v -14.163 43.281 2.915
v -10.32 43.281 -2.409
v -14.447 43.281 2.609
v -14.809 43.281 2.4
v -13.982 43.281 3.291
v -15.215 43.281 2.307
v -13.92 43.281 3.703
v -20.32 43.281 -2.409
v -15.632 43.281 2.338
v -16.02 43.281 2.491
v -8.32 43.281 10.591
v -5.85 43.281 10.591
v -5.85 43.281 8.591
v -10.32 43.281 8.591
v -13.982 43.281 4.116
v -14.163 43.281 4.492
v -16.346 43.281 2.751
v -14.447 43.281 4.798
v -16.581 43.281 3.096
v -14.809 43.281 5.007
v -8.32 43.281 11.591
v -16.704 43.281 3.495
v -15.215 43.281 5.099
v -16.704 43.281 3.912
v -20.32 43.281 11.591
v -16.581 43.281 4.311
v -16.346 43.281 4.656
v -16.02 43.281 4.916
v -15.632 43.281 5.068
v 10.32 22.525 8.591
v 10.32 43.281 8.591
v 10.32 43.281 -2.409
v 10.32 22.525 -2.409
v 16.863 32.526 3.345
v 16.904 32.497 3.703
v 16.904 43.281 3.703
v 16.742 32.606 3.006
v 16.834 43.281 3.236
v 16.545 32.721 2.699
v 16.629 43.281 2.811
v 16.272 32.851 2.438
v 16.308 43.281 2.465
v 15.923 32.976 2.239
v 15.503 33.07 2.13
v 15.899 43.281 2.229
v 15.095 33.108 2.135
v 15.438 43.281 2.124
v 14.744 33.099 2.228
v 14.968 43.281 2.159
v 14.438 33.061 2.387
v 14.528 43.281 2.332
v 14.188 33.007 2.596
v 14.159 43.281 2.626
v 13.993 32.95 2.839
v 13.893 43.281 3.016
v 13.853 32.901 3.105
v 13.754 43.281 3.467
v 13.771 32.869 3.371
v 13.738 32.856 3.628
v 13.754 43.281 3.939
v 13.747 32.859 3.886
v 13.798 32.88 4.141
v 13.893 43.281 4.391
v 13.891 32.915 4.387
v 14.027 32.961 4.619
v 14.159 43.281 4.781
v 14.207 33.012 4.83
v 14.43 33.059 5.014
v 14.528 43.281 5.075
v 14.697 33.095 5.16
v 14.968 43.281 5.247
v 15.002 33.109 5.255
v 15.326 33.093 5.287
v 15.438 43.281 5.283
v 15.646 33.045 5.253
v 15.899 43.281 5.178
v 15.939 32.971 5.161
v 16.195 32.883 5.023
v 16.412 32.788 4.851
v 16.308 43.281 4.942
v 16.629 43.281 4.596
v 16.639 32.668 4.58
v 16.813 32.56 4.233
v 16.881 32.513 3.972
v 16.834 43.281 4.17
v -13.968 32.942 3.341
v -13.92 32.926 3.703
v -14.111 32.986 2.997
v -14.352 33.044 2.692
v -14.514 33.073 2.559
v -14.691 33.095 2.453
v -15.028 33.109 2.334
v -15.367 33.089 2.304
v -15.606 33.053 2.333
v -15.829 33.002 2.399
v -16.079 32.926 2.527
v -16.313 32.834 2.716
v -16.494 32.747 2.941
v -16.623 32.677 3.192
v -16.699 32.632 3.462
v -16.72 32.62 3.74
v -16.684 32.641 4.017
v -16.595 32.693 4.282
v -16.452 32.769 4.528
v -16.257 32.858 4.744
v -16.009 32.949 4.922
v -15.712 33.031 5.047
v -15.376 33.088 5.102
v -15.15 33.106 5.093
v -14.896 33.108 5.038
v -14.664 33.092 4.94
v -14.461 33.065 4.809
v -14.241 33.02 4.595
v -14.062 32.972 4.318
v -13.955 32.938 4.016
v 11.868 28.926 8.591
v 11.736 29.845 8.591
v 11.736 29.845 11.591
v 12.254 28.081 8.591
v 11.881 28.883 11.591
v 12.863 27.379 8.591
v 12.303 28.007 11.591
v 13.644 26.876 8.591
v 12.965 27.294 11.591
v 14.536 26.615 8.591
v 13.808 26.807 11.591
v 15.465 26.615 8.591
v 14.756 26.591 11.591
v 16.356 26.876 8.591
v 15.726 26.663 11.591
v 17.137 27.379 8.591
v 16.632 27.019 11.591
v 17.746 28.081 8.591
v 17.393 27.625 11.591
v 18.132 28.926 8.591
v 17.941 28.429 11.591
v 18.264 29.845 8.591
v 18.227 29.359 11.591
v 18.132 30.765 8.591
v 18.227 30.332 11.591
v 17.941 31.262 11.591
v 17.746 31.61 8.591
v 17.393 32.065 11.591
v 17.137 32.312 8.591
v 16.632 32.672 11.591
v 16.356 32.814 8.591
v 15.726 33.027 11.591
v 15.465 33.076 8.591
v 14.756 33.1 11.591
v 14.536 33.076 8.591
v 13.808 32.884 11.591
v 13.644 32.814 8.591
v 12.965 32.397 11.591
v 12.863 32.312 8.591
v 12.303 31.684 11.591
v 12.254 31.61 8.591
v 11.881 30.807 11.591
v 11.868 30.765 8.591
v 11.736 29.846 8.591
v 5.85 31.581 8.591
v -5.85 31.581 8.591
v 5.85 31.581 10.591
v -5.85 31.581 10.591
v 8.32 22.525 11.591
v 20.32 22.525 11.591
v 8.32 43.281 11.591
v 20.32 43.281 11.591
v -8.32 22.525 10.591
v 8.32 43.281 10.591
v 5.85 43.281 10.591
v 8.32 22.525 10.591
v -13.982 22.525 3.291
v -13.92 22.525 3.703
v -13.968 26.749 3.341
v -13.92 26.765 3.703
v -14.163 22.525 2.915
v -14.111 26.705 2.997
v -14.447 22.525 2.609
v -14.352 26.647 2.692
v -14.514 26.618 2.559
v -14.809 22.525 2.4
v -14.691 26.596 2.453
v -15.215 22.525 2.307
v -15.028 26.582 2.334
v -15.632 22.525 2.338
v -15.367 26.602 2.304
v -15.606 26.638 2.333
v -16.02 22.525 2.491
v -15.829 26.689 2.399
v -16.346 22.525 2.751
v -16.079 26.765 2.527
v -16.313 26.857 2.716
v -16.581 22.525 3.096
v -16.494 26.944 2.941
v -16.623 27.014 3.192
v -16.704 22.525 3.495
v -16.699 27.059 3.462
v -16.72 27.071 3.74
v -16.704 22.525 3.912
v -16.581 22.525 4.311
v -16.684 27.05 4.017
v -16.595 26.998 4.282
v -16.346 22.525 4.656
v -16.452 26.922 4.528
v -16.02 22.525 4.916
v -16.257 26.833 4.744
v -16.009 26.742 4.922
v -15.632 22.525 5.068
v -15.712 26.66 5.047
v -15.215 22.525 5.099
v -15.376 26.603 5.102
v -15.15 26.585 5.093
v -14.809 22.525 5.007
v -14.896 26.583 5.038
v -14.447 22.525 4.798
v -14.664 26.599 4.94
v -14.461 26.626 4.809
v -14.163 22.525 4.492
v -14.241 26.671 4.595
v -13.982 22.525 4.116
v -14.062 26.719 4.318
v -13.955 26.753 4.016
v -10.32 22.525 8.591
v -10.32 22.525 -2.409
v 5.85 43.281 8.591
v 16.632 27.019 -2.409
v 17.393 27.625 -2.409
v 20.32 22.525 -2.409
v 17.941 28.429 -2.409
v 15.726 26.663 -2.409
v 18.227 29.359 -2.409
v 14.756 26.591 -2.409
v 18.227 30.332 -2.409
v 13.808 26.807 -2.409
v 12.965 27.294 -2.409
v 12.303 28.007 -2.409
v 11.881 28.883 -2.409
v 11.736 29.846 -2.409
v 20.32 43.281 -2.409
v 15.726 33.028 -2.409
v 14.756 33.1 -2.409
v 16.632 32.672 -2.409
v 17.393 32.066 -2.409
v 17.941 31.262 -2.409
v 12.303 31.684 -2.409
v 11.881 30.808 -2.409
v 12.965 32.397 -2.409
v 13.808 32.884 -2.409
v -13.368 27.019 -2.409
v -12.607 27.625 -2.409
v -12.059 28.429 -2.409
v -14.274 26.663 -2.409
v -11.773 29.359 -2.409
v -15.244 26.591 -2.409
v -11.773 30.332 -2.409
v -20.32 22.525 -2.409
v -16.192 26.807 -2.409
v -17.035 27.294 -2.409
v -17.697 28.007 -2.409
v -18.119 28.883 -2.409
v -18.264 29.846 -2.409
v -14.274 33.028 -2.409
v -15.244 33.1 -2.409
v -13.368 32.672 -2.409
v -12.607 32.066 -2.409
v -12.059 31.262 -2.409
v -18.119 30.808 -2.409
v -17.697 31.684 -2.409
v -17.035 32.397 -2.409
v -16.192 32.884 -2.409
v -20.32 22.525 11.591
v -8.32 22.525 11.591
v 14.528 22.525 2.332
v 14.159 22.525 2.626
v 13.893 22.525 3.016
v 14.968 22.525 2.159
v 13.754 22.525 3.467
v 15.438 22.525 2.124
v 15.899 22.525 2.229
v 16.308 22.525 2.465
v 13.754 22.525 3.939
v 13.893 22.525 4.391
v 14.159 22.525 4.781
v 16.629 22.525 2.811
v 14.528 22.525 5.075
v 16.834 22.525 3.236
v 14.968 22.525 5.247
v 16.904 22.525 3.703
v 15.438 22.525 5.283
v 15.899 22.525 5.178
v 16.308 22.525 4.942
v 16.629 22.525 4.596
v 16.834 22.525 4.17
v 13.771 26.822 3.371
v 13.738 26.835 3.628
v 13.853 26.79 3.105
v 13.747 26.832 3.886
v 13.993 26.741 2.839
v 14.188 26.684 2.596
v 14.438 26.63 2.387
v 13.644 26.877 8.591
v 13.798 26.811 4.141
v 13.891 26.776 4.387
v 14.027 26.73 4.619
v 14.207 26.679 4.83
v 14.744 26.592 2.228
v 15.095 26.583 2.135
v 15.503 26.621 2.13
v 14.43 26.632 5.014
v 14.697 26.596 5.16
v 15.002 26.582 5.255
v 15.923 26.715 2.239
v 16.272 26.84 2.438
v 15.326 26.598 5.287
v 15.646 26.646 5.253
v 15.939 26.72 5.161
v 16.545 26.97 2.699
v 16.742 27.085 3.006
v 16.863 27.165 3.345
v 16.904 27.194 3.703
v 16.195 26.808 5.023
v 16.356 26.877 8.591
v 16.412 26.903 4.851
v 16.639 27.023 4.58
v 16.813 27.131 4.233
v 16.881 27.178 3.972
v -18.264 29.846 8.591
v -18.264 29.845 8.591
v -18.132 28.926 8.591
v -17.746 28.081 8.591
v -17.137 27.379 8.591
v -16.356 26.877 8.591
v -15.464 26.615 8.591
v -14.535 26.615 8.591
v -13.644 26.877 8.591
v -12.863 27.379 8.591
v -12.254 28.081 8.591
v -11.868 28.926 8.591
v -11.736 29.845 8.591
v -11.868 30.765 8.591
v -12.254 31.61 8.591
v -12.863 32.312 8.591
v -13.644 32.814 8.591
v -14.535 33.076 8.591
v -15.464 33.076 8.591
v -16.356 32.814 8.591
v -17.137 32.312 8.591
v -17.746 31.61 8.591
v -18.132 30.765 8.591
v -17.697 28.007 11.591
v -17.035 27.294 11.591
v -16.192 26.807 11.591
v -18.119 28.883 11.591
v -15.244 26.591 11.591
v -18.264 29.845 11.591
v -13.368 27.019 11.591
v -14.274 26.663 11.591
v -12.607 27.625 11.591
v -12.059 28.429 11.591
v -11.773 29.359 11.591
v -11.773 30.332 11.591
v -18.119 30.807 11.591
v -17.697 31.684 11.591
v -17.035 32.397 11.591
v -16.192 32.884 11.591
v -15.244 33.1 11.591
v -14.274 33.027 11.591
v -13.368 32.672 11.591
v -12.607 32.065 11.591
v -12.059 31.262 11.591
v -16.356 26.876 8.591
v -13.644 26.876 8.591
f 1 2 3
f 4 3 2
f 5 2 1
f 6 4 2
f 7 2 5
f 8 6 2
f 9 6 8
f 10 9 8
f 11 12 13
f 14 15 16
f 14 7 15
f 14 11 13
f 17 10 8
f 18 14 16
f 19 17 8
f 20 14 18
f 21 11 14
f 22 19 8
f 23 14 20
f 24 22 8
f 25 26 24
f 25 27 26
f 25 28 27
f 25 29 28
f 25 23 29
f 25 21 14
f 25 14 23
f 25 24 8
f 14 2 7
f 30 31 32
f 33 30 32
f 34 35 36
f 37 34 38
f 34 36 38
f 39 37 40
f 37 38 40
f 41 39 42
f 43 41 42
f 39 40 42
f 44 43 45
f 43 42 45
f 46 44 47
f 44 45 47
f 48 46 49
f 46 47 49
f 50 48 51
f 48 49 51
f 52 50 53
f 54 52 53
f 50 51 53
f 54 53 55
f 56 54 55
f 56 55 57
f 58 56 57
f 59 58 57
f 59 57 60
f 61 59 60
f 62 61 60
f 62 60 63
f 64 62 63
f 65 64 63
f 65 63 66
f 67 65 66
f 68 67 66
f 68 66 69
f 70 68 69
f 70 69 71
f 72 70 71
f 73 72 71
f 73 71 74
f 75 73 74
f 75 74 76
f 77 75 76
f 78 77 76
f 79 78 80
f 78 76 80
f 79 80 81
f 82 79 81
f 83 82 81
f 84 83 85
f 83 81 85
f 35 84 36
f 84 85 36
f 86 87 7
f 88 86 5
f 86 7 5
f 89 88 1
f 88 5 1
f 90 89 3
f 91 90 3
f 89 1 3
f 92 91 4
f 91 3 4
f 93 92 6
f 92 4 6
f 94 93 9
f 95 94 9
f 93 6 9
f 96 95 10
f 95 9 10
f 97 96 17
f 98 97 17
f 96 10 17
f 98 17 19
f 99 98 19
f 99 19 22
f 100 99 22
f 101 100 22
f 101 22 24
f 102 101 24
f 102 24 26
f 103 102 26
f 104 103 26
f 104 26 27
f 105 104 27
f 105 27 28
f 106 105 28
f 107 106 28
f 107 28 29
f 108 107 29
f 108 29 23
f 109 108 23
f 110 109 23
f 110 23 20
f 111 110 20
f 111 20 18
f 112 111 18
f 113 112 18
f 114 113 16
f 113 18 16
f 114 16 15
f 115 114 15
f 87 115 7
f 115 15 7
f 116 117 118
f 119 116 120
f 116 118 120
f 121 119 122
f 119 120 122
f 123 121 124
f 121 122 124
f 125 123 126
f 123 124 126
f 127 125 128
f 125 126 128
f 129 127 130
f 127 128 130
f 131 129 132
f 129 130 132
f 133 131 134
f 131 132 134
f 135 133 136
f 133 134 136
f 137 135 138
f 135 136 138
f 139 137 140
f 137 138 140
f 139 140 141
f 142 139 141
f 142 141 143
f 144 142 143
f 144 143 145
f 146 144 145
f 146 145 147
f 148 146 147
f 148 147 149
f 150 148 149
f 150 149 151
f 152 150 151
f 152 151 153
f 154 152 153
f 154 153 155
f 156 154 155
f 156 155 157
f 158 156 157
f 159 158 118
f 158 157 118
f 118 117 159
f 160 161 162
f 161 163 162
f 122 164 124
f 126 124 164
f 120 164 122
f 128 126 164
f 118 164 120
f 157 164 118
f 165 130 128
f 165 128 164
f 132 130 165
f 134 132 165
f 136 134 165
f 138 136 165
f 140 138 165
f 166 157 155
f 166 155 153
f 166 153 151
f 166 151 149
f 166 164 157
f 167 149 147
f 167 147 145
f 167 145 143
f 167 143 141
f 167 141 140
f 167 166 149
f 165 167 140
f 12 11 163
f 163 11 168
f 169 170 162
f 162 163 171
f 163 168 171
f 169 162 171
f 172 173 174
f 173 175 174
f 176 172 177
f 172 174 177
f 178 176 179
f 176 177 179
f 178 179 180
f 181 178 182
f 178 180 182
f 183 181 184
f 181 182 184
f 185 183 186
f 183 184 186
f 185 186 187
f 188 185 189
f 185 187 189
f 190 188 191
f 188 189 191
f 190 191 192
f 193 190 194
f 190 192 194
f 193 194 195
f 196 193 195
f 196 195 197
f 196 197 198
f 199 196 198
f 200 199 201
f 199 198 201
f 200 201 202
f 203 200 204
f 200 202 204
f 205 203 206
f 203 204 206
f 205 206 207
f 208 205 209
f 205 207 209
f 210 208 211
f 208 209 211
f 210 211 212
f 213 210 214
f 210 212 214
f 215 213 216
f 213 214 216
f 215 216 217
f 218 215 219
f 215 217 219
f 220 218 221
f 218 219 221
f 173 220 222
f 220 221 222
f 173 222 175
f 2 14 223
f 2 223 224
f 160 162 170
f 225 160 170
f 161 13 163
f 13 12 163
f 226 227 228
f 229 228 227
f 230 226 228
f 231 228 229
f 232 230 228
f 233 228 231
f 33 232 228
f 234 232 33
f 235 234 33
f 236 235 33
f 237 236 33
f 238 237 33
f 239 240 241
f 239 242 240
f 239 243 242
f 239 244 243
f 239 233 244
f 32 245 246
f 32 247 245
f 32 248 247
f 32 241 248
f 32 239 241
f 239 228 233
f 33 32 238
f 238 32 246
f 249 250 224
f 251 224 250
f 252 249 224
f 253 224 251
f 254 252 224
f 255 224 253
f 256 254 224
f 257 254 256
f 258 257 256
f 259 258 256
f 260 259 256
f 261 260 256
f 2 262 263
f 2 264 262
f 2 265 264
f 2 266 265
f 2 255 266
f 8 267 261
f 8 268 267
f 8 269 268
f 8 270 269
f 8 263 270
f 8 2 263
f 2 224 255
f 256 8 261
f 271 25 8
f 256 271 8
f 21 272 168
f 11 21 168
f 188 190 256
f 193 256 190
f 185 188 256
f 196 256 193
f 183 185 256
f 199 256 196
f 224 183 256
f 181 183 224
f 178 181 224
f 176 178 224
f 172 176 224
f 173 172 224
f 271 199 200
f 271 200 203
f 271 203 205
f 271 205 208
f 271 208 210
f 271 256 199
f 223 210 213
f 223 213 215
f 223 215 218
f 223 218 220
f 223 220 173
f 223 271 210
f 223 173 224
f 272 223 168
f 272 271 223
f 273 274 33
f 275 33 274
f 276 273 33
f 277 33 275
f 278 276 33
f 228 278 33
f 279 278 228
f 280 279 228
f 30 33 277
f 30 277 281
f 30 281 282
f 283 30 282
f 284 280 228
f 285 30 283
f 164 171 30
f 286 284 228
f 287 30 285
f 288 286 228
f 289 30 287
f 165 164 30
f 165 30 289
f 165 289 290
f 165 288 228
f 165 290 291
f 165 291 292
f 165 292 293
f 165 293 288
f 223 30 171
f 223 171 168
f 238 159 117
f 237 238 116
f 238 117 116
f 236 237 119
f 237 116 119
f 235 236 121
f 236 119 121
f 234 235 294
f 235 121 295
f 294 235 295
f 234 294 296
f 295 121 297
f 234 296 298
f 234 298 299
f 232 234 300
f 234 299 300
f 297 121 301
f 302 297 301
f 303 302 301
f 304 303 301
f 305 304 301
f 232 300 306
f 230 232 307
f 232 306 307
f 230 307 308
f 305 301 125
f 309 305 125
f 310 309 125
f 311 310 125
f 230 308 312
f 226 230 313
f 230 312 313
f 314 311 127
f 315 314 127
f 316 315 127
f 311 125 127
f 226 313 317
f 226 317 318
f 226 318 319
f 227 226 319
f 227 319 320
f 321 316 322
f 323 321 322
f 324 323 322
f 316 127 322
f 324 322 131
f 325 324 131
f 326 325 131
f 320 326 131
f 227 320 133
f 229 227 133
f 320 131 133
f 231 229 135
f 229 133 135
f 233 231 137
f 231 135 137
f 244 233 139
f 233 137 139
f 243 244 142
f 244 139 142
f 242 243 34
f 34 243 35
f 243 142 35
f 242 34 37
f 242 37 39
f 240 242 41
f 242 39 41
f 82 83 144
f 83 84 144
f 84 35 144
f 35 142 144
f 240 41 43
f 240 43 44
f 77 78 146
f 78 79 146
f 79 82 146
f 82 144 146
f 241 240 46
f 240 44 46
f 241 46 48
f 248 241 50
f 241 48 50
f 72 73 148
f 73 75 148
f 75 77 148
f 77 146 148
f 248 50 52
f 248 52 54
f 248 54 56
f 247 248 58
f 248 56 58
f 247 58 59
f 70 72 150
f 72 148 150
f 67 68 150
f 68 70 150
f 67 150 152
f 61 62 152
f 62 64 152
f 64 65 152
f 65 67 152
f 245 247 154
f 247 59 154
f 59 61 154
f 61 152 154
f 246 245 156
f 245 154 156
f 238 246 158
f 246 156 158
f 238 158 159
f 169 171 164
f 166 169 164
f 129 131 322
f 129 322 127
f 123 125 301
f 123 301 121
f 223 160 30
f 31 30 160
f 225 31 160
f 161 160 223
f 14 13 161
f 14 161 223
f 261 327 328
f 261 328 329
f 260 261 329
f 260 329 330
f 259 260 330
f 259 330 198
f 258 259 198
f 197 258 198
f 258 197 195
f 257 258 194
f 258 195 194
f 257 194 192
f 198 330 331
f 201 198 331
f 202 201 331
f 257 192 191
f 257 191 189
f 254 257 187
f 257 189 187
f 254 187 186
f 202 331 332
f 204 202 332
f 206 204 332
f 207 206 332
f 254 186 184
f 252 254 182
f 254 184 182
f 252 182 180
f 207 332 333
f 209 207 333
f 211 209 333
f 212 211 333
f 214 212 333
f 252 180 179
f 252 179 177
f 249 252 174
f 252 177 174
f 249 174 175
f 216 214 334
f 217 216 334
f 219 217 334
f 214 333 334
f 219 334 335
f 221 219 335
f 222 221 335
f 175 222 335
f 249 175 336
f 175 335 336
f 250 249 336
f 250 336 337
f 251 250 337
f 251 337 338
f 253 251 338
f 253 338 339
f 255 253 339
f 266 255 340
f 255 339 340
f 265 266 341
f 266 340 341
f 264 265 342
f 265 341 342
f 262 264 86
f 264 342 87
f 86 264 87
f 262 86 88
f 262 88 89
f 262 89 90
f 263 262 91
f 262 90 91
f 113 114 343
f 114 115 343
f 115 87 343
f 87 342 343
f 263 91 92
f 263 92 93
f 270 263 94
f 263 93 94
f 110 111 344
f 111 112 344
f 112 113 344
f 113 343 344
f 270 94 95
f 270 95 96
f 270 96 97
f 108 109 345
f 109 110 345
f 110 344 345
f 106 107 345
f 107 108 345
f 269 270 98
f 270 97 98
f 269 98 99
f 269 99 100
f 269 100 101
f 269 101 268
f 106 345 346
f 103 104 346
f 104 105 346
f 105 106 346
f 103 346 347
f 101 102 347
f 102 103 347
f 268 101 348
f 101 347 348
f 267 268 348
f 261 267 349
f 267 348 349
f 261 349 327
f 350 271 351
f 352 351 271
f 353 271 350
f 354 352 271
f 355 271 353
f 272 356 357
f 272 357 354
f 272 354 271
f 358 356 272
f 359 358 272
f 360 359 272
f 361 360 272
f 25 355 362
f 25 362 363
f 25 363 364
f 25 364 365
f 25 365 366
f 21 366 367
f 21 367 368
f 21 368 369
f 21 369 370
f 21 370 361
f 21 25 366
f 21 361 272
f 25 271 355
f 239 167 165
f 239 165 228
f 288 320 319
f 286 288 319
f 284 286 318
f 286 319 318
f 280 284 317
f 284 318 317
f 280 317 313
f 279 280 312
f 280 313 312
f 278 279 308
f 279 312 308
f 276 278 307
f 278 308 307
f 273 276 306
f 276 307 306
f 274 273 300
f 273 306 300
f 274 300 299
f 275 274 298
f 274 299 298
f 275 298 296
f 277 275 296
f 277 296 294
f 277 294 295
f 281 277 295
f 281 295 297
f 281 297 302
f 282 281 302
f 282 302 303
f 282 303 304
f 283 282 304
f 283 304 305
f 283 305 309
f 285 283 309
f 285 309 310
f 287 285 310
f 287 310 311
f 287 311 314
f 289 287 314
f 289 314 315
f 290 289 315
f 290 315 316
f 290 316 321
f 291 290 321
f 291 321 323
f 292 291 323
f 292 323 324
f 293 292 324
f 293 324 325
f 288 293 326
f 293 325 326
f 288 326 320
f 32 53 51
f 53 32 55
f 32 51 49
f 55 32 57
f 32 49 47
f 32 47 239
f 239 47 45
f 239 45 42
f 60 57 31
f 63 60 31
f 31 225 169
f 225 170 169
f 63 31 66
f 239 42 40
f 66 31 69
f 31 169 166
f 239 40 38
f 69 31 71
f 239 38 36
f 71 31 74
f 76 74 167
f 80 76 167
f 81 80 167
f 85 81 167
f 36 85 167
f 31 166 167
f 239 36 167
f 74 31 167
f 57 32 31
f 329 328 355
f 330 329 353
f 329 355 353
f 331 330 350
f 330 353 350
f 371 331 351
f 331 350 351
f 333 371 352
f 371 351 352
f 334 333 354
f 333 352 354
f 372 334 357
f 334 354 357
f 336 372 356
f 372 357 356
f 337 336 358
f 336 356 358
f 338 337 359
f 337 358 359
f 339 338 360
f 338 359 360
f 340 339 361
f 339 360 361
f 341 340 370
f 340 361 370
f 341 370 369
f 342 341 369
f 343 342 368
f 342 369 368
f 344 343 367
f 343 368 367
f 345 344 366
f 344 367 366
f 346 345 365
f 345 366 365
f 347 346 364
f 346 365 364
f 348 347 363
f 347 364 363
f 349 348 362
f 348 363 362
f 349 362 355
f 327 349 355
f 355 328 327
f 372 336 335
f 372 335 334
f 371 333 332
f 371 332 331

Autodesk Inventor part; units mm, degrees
ref_plane "YZ Plane" through (0, 0, 0) normal (1, 0, 0) x (0, 1, 0)
ref_plane "XZ Plane" through (0, 0, 0) normal (0, 1, 0) x (-1, 0, 0)
ref_plane "Work Plane1" through (0, 37.4307, 11.591) normal (0, 0, 1) x (1, 0, 0)
sketch "Sketch1" plane through (0, 37.4307, 11.591) normal (0, 0, 1) x (1, 0, 0)
  circle A0 centre (0, 0) radius 1.2261 construction
  line L0 (4.85, 4.85) -> (-4.85, 4.85) construction
  line L1 (-4.85, 4.85) -> (-4.85, -4.85) construction
  line L2 (-4.85, -4.85) -> (4.85, -4.85) construction
  line L3 (4.85, -4.85) -> (4.85, 4.85) construction
  line L4 (5.85, 5.85) -> (-5.85, 5.85)
  line L5 (-5.85, 5.85) -> (-5.85, -5.85)
  line L6 (-5.85, -5.85) -> (5.85, -5.85)
  line L7 (5.85, -5.85) -> (5.85, 5.85)
  line L8 (20.32, 25.4487) -> (20.32, -10.6193) projected
  line L9 (-20.32, -10.6193) -> (-20.32, 25.4487) projected
  line L10 (5.85, 5.85) -> (20.32, 5.85)
  line L11 (20.32, 5.85) -> (20.32, -5.85)
  line L12 (20.32, -5.85) -> (5.85, -5.85)
  line L13 (5.85, -5.85) -> (5.85, 5.85)
  line L14 (-5.85, 5.85) -> (-20.32, 5.85)
  line L15 (-20.32, 5.85) -> (-20.32, -5.85)
  line L16 (-20.32, -5.85) -> (-5.85, -5.85)
  line L17 (-5.85, -5.85) -> (-5.85, 5.85)
  line L18 (18.034, -12.9053) -> (-18.034, -12.9053) projected
  line L19 (20.32, -5.85) -> (-20.32, -5.85)
  line L20 (-20.32, -5.85) -> (-20.32, -12.9053)
  line L21 (-20.32, -12.9053) -> (20.32, -12.9053)
  line L22 (20.32, -12.9053) -> (20.32, -5.85)
  point P0 (0, -37.4307)
  dimension "d0" = 1
ref_plane "Work Plane2" through (-20.066, 24.7794, 0) normal (0, 0, 1) x (1, 0, 0)
extrude "Extrusion1" add sketch "Sketch1" against normal blind 3 contours L10 L8 L12 L7 | L5 L16 L9 L14 | L12 L8 L22 L21 L18 L20 L9 L16 L6
sketch "Sketch2" plane through (20.32, 24.5254, 11.591) normal (0, 0, -1) x (-1, 0, 0)
  circle A0 centre (35.32, 5.32) radius 3.0099 projected
  circle A1 centre (5.32, 5.32) radius 3.0099 projected
  circle A2 centre (35.32, 5.32) radius 3.2639 projected
  circle A3 centre (5.32, 5.32) radius 3.2639 projected
extrude "Extrusion2" cut sketch "Sketch2" along normal through all contours A0 | A1 | A2 | A3
sketch "Sketch9" plane through (0, 37.4307, 8.591) normal (0, 0, -1) x (-1, 0, 0)
  line L0 (5.85, -5.85) -> (-5.85, -5.85) projected
  circle A0 centre (-15, -7.5852) radius 3.2639 projected
  line L1 (-20.32, 5.85) -> (-20.32, -12.9053) projected
  line L2 (-20.32, -12.9053) -> (20.32, -12.9053) projected
  line L3 (20.32, -12.9053) -> (20.32, 5.85) projected
  circle A1 centre (15, -7.5852) radius 3.2639 projected
  line L4 (-5.85, 5.85) -> (-20.32, 5.85) projected
  line L5 (20.32, 5.85) -> (5.85, 5.85) projected
  line L6 (5.85, 5.85) -> (5.85, -5.85) projected
  line L7 (-5.85, -5.85) -> (-5.85, 5.85) projected
  line L8 (20.32, 5.85) -> (20.32, -12.9053) projected
  line L9 (20.32, 5.85) -> (5.85, 5.85) projected
  line L10 (20.32, -12.9053) -> (10.32, -12.9053)
  line L11 (10.32, -12.9053) -> (10.32, 5.85)
  line L12 (10.32, 5.85) -> (20.32, 5.85)
  line L13 (20.32, 5.85) -> (20.32, -12.9053)
  line L14 (-20.32, -12.9053) -> (-10.32, -12.9053)
  line L15 (-10.32, -12.9053) -> (-10.32, 5.85)
  line L16 (-10.32, 5.85) -> (-20.32, 5.85)
  line L17 (-20.32, 5.85) -> (-20.32, -12.9053)
  point P0 (0, -37.4307)
  dimension "d36" = 10
  dimension "d37" = 10
extrude "Extrusion9" add sketch "Sketch9" along normal blind 4 contours L5 L3 L2 L11 | L15 L2 L1 L4
sketch "Sketch10" plane through (-20.32, 24.5254, 11.591) normal (0, -1, 0) x (1, 0, 0)
  line L0 (0, 0) -> (40.64, 0) projected
  line L1 (0, 0) -> (0, -7) projected
  line L2 (10, -7) -> (0, -7) projected
  line L3 (10, -3) -> (10, -7) projected
  line L4 (30.64, -3) -> (10, -3) projected
  line L5 (30.64, -3) -> (30.64, -7) projected
  line L6 (40.64, -7) -> (30.64, -7) projected
  line L7 (40.64, 0) -> (40.64, -7) projected
  point P0 (20.32, -11.591)
extrude "Extrusion10" add sketch "Sketch10" along normal blind 2
sketch "Sketch12" plane through (-20.32, 22.5254, 11.591) normal (0, -1, 0) x (1, 0, 0)
  line L0 (40.64, 0) -> (0, 0) projected
  line L1 (0, 0) -> (0, -7) projected
  line L2 (0, -7) -> (10, -7) projected
  line L3 (10, -7) -> (10, -3) projected
  line L4 (10, -3) -> (30.64, -3) projected
  line L5 (30.64, -3) -> (30.64, -7) projected
  line L6 (30.64, -7) -> (40.64, -7) projected
  line L7 (40.64, -7) -> (40.64, 0) projected
  line L8 (40.64, 0) -> (26.17, 0) projected
  line L9 (28.64, 0) -> (12, 0)
  line L10 (12, 0) -> (12, -1)
  line L11 (12, -1) -> (28.64, -1)
  line L12 (28.64, -1) -> (28.64, 0)
  point P0 (20.32, -11.591)
  dimension "d49" = 1
  dimension "d52" = 2
  dimension "d53" = 2
extrude "Extrusion11" cut sketch "Sketch12" against normal through all contours L12 L11 L10 L0
sketch "Sketch13" plane through (0, 37.4307, 4.591) normal (0, 0, -1) x (-1, 0, 0)
  circle A0 centre (15, -7.5852) radius 3.2639 projected
  line L0 (20.32, 5.85) -> (20.32, -14.9053) projected
  line L1 (20.32, 5.85) -> (10.32, 5.85) projected
  line L2 (10.32, 5.85) -> (10.32, -14.9053) projected
  line L3 (20.32, -14.9053) -> (10.32, -14.9053) projected
  circle A1 centre (-15, -7.5852) radius 3.2639 projected
  line L4 (-10.32, 5.85) -> (-10.32, -14.9053) projected
  line L5 (-10.32, 5.85) -> (-20.32, 5.85) projected
  line L6 (-20.32, 5.85) -> (-20.32, -14.9053) projected
  line L7 (-10.32, -14.9053) -> (-20.32, -14.9053) projected
  point P0 (0, -37.4307)
extrude "Extrusion12" add sketch "Sketch13" along normal blind 7
sketch "Sketch14" plane through (-10.32, 43.2807, 8.591) normal (0, 1, 0) x (1, 0, 0)
  line L0 (2, -2) -> (4.47, -2) projected
  line L1 (4.47, -2) -> (4.47, 0) projected
  line L2 (0, 0) -> (4.47, 0) projected
  line L3 (0, 0) -> (0, 11) projected
  line L4 (-10, 11) -> (0, 11) projected
  line L5 (-10, -3) -> (-10, 11) projected
  line L6 (2, -3) -> (-10, -3) projected
  line L7 (2, -3) -> (2, -2) projected
  line L8 (16.17, -2) -> (18.64, -2) projected
  line L9 (18.64, -2) -> (18.64, -3) projected
  line L10 (30.64, -3) -> (18.64, -3) projected
  line L11 (30.64, -3) -> (30.64, 11) projected
  line L12 (20.64, 11) -> (30.64, 11) projected
  line L13 (20.64, 0) -> (20.64, 11) projected
  line L14 (16.17, 0) -> (20.64, 0) projected
  line L15 (16.17, -2) -> (16.17, 0) projected
  line L16 (-7.9439, -3) -> (-7.9439, 11) projected
  line L17 (-1.4161, -3) -> (-1.4161, 11) projected
  line L18 (22.0561, -3) -> (22.0561, 11) projected
  line L19 (28.5839, -3) -> (28.5839, 11) projected
  circle A0 centre (-5, 4.8877) radius 1.4
  circle A1 centre (25.64, 4.8877) radius 1.5839
  point P0 (10.32, 8.591)
  dimension "d56" = 2.8
extrude "Extrusion13" cut sketch "Sketch14" against normal through all contours A0 | A1
properties part number "20_Adapter_Bluray_KES400_Lens_Thorlabs_v2"
